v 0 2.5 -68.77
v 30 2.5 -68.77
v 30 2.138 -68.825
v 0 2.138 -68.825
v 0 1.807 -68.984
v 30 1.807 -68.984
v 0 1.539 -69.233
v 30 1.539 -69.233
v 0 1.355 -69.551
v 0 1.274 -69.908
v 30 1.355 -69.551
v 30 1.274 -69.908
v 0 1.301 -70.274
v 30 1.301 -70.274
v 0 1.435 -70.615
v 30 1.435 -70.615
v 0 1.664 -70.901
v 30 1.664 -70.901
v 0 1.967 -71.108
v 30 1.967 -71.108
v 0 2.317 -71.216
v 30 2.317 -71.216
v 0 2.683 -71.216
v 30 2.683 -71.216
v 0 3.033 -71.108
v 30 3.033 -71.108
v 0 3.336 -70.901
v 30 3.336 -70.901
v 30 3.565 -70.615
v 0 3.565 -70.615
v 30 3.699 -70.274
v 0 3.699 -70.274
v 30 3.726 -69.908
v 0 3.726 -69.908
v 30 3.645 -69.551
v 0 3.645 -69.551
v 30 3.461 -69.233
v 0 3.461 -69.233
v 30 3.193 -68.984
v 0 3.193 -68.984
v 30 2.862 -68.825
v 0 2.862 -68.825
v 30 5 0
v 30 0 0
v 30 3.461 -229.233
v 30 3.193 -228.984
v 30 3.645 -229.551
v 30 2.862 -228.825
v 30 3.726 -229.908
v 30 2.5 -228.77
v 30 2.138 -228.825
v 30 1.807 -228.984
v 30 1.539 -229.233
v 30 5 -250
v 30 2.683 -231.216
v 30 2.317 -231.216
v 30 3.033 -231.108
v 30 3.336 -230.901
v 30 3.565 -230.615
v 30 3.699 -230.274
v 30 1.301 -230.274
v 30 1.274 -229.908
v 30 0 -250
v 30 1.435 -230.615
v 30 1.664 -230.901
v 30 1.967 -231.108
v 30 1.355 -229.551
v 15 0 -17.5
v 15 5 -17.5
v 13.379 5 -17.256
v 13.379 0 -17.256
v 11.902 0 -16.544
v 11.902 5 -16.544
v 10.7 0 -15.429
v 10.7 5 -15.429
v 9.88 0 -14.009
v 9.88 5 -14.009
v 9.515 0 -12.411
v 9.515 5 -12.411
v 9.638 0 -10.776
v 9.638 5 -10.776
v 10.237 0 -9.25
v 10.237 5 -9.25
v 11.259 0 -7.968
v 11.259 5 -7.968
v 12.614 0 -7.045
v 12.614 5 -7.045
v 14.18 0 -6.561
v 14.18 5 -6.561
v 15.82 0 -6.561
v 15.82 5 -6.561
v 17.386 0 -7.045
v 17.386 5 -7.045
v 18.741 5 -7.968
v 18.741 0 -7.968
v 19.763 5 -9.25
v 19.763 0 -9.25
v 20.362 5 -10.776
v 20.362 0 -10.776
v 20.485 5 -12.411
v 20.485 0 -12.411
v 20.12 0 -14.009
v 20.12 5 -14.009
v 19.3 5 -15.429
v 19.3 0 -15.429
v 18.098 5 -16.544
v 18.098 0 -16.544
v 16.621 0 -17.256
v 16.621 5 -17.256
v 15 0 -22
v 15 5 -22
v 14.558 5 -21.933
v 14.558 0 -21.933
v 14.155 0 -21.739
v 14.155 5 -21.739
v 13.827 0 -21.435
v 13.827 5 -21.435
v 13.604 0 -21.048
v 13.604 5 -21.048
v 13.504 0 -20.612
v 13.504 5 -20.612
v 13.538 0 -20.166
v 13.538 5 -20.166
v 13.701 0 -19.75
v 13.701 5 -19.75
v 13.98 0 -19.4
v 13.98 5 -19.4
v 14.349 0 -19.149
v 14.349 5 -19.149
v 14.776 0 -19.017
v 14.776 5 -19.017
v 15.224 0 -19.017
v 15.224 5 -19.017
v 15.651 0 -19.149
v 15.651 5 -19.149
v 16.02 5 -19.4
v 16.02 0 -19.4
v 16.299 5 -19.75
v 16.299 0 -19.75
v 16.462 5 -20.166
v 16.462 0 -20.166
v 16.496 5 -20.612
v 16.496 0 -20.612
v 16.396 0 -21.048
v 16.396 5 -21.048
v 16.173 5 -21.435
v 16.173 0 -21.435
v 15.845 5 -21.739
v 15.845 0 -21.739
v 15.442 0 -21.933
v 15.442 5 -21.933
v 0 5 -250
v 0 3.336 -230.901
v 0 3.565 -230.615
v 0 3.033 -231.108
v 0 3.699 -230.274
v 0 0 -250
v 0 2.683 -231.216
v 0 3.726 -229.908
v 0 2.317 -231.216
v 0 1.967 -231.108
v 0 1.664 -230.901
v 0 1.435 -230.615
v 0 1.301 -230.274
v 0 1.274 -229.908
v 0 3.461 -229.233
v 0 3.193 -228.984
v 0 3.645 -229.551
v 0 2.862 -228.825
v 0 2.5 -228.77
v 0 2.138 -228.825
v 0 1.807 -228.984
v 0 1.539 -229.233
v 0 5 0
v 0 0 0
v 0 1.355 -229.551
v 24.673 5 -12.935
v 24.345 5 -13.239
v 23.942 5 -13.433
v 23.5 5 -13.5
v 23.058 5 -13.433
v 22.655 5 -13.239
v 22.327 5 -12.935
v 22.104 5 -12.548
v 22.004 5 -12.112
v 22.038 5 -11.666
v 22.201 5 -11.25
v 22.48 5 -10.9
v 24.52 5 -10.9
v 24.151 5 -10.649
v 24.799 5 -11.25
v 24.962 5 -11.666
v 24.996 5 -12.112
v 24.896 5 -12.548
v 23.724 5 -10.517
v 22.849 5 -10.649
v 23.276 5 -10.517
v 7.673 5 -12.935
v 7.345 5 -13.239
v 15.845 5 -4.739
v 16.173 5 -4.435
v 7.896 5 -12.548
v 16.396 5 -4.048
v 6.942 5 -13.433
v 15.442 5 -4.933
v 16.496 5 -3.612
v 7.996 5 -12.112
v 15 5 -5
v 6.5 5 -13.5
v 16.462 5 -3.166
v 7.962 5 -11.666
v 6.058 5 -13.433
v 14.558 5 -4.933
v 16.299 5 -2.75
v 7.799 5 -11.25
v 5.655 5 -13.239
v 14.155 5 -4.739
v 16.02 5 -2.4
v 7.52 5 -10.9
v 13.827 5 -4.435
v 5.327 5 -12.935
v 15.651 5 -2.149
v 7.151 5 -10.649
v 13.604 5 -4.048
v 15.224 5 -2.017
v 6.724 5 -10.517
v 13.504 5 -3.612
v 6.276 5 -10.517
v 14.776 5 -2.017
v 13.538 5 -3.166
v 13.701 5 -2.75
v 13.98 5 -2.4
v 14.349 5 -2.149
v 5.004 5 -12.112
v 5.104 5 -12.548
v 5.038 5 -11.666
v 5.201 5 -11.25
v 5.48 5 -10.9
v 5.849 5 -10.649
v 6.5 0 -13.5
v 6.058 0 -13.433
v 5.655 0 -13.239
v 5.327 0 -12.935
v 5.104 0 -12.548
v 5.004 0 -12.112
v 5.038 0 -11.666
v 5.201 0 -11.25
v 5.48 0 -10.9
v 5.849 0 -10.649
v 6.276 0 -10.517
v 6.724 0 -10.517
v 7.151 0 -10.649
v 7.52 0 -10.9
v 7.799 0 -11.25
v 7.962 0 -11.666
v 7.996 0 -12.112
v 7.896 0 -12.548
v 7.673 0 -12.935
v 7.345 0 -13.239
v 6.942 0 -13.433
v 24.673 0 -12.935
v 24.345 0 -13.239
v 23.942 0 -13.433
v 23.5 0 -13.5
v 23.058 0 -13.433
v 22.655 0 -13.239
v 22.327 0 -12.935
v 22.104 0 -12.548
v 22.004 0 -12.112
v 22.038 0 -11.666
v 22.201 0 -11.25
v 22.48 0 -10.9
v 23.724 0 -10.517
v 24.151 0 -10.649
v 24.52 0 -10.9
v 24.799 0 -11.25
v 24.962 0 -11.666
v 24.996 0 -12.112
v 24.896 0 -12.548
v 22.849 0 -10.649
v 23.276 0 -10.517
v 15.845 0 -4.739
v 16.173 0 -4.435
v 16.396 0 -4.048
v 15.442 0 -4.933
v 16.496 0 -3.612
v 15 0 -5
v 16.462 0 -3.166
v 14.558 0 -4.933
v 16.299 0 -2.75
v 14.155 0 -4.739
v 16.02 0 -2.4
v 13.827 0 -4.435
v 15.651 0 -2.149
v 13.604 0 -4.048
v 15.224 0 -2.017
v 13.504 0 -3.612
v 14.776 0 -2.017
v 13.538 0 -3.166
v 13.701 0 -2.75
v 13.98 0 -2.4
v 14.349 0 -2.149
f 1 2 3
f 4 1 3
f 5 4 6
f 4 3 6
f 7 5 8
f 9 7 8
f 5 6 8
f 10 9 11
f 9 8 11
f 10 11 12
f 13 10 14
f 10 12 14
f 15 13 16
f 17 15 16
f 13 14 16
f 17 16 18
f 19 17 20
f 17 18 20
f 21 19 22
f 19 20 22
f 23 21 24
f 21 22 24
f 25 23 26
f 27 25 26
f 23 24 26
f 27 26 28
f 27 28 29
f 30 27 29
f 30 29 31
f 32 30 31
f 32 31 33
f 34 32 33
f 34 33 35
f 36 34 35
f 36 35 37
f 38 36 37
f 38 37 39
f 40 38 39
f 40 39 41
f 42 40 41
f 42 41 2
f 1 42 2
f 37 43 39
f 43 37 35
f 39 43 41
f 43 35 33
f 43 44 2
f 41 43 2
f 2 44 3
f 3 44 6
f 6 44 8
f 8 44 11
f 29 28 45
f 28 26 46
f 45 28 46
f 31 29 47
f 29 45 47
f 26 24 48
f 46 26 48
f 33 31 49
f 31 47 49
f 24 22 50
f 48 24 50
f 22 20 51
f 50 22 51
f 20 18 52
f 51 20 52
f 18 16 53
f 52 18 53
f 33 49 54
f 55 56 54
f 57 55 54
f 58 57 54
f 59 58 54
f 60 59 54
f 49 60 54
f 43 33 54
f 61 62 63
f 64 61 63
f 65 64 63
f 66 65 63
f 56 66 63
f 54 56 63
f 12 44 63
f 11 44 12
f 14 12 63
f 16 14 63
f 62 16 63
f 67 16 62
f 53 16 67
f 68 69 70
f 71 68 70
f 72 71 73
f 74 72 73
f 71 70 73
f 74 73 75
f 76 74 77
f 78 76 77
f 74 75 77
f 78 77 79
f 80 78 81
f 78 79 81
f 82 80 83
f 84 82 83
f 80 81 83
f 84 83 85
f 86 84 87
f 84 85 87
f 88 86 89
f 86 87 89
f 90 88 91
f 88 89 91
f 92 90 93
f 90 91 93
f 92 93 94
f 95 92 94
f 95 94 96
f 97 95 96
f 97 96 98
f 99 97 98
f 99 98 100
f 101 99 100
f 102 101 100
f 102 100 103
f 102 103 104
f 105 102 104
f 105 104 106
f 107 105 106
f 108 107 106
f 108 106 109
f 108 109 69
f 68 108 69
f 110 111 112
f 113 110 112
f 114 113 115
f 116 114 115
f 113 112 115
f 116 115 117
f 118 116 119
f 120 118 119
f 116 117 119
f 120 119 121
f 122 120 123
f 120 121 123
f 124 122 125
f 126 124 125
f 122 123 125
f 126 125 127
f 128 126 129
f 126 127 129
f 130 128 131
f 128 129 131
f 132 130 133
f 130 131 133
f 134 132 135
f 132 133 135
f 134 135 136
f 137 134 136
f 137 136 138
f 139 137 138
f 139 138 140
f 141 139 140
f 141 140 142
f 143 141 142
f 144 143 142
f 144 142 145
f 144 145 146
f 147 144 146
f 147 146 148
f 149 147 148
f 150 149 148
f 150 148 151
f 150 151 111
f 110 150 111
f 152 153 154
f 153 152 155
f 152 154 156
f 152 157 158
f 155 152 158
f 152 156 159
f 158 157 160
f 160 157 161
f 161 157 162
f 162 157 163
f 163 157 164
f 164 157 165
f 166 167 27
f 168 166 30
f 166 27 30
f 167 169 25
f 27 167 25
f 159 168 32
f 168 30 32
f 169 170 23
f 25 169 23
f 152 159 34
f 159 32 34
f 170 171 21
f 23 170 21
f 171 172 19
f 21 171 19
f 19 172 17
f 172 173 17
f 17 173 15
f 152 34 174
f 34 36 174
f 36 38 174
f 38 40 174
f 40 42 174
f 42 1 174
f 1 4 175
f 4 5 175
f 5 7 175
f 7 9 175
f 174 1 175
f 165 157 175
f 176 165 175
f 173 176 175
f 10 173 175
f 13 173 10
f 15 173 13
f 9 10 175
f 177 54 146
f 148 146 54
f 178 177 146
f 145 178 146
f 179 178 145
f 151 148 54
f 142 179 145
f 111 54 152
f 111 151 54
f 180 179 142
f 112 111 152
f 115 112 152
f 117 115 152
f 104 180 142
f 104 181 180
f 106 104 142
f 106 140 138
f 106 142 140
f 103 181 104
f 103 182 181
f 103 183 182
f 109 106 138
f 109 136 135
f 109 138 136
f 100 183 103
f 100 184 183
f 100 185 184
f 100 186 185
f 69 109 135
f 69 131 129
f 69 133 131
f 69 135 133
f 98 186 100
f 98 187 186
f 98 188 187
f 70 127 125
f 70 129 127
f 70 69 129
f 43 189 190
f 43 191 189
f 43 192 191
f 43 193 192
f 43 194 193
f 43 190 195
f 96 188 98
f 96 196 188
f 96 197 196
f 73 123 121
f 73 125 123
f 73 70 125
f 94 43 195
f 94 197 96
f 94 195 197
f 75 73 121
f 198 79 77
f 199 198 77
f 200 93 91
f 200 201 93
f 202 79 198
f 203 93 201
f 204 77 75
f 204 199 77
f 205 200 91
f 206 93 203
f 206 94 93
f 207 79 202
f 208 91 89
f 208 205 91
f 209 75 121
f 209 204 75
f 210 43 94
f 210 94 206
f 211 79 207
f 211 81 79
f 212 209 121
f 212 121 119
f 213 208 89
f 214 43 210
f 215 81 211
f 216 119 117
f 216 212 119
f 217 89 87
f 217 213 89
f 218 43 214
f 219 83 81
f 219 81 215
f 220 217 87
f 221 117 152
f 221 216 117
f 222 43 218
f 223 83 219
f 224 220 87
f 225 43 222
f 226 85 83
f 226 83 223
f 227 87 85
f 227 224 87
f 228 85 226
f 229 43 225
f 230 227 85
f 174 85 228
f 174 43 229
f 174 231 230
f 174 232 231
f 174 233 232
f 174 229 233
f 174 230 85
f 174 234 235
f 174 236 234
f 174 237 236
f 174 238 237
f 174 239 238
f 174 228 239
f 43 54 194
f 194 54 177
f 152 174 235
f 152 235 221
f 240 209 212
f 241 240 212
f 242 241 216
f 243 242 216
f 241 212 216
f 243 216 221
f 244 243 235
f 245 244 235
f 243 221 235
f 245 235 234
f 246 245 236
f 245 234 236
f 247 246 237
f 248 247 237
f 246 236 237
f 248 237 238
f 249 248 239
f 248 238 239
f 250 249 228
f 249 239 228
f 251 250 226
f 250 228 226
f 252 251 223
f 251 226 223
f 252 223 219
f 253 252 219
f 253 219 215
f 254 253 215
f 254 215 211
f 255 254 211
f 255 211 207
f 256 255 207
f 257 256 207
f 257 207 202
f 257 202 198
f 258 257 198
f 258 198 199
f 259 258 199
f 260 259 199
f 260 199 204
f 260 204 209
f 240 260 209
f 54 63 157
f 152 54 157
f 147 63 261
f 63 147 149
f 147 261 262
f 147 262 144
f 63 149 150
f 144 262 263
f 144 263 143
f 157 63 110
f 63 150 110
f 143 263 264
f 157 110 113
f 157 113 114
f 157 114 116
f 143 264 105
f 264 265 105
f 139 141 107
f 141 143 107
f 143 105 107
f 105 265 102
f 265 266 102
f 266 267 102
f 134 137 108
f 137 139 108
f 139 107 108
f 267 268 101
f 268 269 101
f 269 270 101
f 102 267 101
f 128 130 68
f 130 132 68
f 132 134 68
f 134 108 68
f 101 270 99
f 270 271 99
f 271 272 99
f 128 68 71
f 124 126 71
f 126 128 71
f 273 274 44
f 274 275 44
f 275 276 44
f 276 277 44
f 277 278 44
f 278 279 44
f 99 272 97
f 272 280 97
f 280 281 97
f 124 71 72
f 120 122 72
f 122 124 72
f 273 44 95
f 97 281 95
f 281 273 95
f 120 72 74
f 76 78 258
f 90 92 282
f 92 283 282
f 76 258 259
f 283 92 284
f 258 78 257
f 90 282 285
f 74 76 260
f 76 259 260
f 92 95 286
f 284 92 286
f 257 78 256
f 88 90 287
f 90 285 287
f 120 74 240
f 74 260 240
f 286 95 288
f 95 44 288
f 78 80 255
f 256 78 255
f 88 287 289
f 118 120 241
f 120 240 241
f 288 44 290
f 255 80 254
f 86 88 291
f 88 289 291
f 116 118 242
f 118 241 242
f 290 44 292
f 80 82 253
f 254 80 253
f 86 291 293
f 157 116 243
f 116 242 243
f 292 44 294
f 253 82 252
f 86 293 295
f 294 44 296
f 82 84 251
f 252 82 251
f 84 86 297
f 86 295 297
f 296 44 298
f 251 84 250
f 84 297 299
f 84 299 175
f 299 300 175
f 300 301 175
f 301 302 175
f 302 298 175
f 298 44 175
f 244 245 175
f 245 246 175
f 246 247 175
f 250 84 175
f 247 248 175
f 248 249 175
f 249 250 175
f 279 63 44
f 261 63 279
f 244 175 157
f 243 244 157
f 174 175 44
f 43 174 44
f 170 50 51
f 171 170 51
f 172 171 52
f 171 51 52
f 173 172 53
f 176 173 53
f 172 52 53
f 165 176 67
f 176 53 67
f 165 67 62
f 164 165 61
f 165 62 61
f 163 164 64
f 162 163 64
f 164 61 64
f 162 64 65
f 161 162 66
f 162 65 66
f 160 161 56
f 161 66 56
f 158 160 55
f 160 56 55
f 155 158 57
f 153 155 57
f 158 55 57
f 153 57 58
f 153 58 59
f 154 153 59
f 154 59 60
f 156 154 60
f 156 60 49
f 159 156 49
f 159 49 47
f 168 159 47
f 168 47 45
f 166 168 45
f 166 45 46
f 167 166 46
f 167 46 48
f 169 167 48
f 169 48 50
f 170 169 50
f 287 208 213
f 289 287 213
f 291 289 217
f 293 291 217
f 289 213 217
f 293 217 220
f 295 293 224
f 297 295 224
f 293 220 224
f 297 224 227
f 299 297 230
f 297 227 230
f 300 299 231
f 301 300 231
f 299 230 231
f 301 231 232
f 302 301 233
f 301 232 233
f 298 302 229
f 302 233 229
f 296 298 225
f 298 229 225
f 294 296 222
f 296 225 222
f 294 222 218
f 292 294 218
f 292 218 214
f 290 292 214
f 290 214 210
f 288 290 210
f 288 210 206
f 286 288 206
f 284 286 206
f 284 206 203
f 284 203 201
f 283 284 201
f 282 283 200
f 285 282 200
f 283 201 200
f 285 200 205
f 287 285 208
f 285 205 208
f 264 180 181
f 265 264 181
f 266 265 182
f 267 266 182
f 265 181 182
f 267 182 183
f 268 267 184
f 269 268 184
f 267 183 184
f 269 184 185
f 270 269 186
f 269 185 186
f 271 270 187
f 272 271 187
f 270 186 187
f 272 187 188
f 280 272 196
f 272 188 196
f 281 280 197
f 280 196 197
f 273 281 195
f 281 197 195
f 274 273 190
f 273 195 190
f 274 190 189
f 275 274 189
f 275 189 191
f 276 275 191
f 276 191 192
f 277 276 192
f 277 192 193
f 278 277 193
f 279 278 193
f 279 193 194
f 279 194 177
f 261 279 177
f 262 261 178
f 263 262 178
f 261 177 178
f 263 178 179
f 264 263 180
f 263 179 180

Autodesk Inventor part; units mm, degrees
ref_plane "YZ Plane" through (0, 0, 0) normal (1, 0, 0) x (0, 1, 0)
ref_plane "XZ Plane" through (0, 0, 0) normal (0, 1, 0) x (-1, 0, 0)
ref_plane "XY Plane" through (0, 0, 0) normal (0, 0, 1) x (1, 0, 0)
sketch "スケッチ1" plane through (0, 0, 0) normal (0, 1, 0) x (-1, 0, 0)
  line L0 (0, 0) -> (-30, 0)
  line L1 (-30, 0) -> (-30, -250)
  line L2 (-30, -250) -> (0, -250)
  line L3 (0, -250) -> (0, 0)
  point P0 (-15, -12)
  dimension "d0" = 250
  dimension "d1" = 30
  dimension "d4" = 15
  dimension "d5" = 12
extrude "押し出し1" add sketch "スケッチ1" along normal blind 5
sketch "スケッチ2" plane through (0, 0, 0) normal (0, -1, 0) x (1, 0, 0)
  line L0 (0, -250) -> (0, 0) projected
  line L1 (0, 0) -> (30, 0) projected
  point P0 (15, -12)
  dimension "d6" = 15
  dimension "d7" = 12
hole "穴1" at (15, 0, -12) direction (0, 1, 0) diameter 11 end through all
sketch "スケッチ3" plane through (0, 0, 0) normal (0, -1, 0) x (1, 0, 0)
  line L0 (0, 0) -> (30, 0)
  circle A0 centre (15, -12) radius 4
  point P0 (23.5, -12)
  point P1 (15, -3.5)
  point P2 (6.5, -12)
  point P3 (15, -20.5)
  dimension "d17" = 360
hole "穴2" at (23.5, 0, -12) at (15, 0, -3.5) at (6.5, 0, -12) at (15, 0, -20.5) direction (0, 1, 0) diameter 3 end through all
sketch "スケッチ4" plane through (0, 0, -250) normal (-1, 0, 0) x (0, 0, 1)
  line L0 (0, 5) -> (250, 5) projected
  line L1 (0, 0) -> (0, 5) projected
  point P0 (250, 0)
  point P1 (180, 2.5)
  point P2 (20, 2.5)
  dimension "d25" = 2.5
  dimension "d26" = 180
  dimension "d27" = 20
hole "穴3" at (0, 2.5, -70) at (0, 2.5, -230) direction (1, 0, 0) diameter 2.459 end through all thread size "M3x0.5" class "6H" standard "ANSI Metric M Profile"
properties part number "横長3rdフラットバー" material "アルミニウム 6061"
